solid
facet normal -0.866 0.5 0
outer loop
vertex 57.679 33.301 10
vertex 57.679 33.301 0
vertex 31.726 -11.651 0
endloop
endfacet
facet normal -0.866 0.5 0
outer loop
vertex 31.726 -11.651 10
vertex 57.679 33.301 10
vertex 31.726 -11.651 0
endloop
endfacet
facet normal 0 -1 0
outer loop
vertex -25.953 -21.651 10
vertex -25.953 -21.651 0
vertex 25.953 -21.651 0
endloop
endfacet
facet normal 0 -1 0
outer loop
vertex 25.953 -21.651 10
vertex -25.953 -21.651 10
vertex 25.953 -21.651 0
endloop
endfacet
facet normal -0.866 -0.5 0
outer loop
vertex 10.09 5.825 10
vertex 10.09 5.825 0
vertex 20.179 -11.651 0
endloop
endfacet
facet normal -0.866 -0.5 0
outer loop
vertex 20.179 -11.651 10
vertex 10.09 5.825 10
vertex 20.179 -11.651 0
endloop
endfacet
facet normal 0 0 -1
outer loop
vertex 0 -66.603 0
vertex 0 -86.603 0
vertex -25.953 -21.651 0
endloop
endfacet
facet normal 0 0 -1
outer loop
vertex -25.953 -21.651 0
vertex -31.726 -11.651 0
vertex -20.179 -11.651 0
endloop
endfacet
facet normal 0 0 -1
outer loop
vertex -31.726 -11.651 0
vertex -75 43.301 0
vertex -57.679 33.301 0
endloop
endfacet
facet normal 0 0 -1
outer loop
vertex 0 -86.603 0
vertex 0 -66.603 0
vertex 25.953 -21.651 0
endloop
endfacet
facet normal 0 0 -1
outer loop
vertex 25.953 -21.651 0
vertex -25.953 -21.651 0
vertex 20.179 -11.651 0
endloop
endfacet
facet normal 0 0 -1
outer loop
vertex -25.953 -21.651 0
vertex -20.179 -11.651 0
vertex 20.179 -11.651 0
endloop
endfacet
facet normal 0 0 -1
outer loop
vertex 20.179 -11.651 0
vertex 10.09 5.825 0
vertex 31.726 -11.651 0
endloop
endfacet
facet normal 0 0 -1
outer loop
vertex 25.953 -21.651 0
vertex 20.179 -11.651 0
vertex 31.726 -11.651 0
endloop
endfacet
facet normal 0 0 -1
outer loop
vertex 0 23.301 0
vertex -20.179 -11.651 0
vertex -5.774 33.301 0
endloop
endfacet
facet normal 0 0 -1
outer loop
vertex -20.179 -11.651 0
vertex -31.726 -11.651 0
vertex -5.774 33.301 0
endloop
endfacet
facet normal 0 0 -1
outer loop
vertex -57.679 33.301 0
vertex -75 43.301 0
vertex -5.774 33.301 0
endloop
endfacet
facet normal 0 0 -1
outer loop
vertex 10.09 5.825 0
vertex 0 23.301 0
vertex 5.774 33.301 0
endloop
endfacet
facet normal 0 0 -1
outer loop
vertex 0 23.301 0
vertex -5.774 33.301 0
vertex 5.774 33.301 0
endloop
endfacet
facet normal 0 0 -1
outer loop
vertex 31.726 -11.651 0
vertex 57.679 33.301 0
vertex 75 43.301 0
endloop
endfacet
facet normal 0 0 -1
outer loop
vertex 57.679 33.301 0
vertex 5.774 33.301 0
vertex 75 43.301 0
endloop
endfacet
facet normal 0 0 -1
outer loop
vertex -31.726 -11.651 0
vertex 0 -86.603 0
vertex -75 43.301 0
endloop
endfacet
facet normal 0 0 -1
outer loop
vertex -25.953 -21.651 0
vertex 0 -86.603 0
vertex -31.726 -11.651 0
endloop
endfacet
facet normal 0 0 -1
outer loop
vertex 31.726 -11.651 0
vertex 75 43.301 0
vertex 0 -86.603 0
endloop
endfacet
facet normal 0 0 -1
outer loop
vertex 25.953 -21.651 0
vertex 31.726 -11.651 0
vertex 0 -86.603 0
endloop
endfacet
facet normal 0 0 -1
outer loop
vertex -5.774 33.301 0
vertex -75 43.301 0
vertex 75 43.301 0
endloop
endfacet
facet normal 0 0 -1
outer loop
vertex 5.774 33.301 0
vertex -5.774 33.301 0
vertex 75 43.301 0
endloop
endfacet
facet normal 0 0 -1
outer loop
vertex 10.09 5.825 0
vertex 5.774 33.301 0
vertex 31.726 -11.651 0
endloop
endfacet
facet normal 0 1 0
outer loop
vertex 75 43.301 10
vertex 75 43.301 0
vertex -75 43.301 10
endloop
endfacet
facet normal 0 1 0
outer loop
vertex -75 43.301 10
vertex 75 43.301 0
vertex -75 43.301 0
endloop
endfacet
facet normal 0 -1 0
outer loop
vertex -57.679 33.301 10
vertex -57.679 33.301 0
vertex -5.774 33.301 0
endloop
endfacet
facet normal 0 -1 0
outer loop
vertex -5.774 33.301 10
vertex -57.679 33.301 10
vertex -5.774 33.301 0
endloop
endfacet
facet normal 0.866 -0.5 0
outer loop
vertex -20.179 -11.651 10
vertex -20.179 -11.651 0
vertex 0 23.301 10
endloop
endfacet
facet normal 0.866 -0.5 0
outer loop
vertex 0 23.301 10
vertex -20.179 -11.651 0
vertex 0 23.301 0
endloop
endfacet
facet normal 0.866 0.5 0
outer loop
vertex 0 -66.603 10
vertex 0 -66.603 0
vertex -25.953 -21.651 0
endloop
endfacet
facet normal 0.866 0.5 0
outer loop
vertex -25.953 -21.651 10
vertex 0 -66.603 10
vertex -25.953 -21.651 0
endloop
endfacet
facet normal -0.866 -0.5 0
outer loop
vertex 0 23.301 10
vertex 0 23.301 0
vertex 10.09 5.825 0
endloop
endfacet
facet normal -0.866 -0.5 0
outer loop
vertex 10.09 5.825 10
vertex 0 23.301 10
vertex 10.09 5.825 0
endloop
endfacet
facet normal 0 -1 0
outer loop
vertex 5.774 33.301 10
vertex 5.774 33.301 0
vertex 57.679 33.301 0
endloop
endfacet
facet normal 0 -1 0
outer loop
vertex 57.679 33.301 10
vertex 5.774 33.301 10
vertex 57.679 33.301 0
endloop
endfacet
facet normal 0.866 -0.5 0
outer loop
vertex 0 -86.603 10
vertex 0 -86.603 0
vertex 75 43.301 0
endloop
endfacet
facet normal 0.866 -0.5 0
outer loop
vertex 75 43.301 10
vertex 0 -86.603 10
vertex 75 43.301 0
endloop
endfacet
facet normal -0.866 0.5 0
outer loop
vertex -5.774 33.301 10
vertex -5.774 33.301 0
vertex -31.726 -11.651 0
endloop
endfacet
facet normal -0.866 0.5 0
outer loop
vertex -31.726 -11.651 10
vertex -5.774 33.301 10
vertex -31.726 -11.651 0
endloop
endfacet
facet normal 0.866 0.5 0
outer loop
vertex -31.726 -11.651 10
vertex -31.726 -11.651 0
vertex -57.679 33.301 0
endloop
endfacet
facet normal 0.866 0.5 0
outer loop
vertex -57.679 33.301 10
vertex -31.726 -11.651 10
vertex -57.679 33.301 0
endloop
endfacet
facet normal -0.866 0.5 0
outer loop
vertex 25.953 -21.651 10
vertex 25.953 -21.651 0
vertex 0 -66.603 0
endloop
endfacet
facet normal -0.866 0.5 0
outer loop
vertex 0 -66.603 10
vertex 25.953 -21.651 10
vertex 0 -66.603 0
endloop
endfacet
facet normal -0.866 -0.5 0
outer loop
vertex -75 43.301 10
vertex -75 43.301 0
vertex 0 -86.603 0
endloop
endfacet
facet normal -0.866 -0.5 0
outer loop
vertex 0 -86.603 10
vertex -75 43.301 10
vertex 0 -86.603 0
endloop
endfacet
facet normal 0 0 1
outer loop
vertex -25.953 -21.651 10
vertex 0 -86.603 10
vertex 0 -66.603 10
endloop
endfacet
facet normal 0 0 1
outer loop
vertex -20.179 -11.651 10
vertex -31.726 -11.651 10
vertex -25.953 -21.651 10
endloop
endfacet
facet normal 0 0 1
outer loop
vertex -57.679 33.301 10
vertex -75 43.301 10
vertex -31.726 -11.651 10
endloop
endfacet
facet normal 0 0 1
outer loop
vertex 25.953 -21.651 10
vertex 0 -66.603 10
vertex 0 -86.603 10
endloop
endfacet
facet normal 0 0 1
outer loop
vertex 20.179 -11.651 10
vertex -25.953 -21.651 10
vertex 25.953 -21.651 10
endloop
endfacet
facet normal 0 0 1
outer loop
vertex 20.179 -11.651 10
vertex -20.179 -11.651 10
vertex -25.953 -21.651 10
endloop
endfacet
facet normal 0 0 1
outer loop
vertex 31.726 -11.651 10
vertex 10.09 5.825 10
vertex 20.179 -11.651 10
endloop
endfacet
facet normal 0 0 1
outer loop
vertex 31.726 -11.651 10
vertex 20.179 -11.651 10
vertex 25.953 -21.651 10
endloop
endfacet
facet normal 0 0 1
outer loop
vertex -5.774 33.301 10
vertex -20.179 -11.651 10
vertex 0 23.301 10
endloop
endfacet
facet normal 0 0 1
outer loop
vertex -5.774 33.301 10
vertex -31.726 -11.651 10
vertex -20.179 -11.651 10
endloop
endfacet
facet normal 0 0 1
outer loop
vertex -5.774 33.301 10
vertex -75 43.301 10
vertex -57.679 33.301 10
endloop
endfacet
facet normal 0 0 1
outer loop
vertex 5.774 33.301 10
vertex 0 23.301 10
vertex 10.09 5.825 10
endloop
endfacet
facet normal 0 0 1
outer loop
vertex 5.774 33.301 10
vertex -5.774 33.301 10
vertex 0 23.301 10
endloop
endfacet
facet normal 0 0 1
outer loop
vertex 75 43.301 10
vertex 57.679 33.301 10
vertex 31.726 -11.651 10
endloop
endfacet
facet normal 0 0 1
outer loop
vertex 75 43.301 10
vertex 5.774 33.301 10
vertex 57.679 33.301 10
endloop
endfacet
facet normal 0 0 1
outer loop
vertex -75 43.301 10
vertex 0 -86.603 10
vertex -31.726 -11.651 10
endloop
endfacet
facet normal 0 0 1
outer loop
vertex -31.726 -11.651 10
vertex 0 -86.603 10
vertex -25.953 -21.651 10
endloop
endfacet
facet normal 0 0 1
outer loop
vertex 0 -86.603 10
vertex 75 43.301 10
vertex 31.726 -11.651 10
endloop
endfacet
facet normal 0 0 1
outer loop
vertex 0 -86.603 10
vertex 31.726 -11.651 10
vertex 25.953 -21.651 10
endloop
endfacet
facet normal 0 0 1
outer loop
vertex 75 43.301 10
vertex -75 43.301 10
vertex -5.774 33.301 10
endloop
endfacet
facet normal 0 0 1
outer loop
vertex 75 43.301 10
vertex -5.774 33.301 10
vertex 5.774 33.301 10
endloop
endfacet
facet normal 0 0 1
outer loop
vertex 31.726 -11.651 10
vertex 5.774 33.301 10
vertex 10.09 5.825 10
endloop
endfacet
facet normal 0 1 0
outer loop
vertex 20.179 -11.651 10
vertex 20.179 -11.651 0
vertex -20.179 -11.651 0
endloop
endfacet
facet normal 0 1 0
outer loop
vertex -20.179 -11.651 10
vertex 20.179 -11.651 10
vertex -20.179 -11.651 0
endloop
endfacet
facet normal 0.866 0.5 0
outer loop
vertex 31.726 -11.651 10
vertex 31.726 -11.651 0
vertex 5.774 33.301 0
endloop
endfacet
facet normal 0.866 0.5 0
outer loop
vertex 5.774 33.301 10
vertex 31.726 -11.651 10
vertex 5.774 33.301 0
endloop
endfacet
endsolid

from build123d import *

# Parameters (mm, degrees)
F1_DEPTH = 10


with BuildPart() as f1:
    # F0 (on Top) → F1 (new body)
    with BuildSketch(Plane.XY):
        Polygon((0, 43.3012701892), (-75, 43.3012701892), (-37.5, -21.6506350946), (-31.7264973081, -11.6506350946), (-57.6794919243, 33.3012701892), (-5.7735026919, 33.3012701892), align=None)
        Polygon((5.7735026919, 33.3012701892), (-5.7735026919, 33.3012701892), (-31.7264973081, -11.6506350946), (-28.8397459622, -16.6506350946), (-20.1794919243, -11.6506350946), (0, 23.3012701892), (10.0897459622, 5.8253175473), (18.75, 10.8253175473), align=None)
        Polygon((5.7735026919, 33.3012701892), (0, 43.3012701892), (-5.7735026919, 33.3012701892), align=None)
        Polygon((75, 43.3012701892), (0, 43.3012701892), (5.7735026919, 33.3012701892), (57.6794919243, 33.3012701892), align=None)
        Polygon((-20.1794919243, -11.6506350946), (-28.8397459622, -16.6506350946), (-25.9529946162, -21.6506350946), (25.9529946162, -21.6506350946), (31.7264973081, -11.6506350946), (18.75, 10.8253175473), (10.0897459622, 5.8253175473), (20.1794919243, -11.6506350946), align=None)
        Polygon((37.5, -21.6506350946), (75, 43.3012701892), (57.6794919243, 33.3012701892), (31.7264973081, -11.6506350946), align=None)
        Polygon((25.9529946162, -21.6506350946), (37.5, -21.6506350946), (31.7264973081, -11.6506350946), align=None)
        Polygon((-25.9529946162, -21.6506350946), (-37.5, -21.6506350946), (0, -86.6025403784), (37.5, -21.6506350946), (25.9529946162, -21.6506350946), (0, -66.6025403784), align=None)
        Polygon((-31.7264973081, -11.6506350946), (-37.5, -21.6506350946), (-28.8397459622, -16.6506350946), align=None)
        Polygon((-28.8397459622, -16.6506350946), (-37.5, -21.6506350946), (-25.9529946162, -21.6506350946), align=None)
    extrude(amount=F1_DEPTH)


solid = f1.part
